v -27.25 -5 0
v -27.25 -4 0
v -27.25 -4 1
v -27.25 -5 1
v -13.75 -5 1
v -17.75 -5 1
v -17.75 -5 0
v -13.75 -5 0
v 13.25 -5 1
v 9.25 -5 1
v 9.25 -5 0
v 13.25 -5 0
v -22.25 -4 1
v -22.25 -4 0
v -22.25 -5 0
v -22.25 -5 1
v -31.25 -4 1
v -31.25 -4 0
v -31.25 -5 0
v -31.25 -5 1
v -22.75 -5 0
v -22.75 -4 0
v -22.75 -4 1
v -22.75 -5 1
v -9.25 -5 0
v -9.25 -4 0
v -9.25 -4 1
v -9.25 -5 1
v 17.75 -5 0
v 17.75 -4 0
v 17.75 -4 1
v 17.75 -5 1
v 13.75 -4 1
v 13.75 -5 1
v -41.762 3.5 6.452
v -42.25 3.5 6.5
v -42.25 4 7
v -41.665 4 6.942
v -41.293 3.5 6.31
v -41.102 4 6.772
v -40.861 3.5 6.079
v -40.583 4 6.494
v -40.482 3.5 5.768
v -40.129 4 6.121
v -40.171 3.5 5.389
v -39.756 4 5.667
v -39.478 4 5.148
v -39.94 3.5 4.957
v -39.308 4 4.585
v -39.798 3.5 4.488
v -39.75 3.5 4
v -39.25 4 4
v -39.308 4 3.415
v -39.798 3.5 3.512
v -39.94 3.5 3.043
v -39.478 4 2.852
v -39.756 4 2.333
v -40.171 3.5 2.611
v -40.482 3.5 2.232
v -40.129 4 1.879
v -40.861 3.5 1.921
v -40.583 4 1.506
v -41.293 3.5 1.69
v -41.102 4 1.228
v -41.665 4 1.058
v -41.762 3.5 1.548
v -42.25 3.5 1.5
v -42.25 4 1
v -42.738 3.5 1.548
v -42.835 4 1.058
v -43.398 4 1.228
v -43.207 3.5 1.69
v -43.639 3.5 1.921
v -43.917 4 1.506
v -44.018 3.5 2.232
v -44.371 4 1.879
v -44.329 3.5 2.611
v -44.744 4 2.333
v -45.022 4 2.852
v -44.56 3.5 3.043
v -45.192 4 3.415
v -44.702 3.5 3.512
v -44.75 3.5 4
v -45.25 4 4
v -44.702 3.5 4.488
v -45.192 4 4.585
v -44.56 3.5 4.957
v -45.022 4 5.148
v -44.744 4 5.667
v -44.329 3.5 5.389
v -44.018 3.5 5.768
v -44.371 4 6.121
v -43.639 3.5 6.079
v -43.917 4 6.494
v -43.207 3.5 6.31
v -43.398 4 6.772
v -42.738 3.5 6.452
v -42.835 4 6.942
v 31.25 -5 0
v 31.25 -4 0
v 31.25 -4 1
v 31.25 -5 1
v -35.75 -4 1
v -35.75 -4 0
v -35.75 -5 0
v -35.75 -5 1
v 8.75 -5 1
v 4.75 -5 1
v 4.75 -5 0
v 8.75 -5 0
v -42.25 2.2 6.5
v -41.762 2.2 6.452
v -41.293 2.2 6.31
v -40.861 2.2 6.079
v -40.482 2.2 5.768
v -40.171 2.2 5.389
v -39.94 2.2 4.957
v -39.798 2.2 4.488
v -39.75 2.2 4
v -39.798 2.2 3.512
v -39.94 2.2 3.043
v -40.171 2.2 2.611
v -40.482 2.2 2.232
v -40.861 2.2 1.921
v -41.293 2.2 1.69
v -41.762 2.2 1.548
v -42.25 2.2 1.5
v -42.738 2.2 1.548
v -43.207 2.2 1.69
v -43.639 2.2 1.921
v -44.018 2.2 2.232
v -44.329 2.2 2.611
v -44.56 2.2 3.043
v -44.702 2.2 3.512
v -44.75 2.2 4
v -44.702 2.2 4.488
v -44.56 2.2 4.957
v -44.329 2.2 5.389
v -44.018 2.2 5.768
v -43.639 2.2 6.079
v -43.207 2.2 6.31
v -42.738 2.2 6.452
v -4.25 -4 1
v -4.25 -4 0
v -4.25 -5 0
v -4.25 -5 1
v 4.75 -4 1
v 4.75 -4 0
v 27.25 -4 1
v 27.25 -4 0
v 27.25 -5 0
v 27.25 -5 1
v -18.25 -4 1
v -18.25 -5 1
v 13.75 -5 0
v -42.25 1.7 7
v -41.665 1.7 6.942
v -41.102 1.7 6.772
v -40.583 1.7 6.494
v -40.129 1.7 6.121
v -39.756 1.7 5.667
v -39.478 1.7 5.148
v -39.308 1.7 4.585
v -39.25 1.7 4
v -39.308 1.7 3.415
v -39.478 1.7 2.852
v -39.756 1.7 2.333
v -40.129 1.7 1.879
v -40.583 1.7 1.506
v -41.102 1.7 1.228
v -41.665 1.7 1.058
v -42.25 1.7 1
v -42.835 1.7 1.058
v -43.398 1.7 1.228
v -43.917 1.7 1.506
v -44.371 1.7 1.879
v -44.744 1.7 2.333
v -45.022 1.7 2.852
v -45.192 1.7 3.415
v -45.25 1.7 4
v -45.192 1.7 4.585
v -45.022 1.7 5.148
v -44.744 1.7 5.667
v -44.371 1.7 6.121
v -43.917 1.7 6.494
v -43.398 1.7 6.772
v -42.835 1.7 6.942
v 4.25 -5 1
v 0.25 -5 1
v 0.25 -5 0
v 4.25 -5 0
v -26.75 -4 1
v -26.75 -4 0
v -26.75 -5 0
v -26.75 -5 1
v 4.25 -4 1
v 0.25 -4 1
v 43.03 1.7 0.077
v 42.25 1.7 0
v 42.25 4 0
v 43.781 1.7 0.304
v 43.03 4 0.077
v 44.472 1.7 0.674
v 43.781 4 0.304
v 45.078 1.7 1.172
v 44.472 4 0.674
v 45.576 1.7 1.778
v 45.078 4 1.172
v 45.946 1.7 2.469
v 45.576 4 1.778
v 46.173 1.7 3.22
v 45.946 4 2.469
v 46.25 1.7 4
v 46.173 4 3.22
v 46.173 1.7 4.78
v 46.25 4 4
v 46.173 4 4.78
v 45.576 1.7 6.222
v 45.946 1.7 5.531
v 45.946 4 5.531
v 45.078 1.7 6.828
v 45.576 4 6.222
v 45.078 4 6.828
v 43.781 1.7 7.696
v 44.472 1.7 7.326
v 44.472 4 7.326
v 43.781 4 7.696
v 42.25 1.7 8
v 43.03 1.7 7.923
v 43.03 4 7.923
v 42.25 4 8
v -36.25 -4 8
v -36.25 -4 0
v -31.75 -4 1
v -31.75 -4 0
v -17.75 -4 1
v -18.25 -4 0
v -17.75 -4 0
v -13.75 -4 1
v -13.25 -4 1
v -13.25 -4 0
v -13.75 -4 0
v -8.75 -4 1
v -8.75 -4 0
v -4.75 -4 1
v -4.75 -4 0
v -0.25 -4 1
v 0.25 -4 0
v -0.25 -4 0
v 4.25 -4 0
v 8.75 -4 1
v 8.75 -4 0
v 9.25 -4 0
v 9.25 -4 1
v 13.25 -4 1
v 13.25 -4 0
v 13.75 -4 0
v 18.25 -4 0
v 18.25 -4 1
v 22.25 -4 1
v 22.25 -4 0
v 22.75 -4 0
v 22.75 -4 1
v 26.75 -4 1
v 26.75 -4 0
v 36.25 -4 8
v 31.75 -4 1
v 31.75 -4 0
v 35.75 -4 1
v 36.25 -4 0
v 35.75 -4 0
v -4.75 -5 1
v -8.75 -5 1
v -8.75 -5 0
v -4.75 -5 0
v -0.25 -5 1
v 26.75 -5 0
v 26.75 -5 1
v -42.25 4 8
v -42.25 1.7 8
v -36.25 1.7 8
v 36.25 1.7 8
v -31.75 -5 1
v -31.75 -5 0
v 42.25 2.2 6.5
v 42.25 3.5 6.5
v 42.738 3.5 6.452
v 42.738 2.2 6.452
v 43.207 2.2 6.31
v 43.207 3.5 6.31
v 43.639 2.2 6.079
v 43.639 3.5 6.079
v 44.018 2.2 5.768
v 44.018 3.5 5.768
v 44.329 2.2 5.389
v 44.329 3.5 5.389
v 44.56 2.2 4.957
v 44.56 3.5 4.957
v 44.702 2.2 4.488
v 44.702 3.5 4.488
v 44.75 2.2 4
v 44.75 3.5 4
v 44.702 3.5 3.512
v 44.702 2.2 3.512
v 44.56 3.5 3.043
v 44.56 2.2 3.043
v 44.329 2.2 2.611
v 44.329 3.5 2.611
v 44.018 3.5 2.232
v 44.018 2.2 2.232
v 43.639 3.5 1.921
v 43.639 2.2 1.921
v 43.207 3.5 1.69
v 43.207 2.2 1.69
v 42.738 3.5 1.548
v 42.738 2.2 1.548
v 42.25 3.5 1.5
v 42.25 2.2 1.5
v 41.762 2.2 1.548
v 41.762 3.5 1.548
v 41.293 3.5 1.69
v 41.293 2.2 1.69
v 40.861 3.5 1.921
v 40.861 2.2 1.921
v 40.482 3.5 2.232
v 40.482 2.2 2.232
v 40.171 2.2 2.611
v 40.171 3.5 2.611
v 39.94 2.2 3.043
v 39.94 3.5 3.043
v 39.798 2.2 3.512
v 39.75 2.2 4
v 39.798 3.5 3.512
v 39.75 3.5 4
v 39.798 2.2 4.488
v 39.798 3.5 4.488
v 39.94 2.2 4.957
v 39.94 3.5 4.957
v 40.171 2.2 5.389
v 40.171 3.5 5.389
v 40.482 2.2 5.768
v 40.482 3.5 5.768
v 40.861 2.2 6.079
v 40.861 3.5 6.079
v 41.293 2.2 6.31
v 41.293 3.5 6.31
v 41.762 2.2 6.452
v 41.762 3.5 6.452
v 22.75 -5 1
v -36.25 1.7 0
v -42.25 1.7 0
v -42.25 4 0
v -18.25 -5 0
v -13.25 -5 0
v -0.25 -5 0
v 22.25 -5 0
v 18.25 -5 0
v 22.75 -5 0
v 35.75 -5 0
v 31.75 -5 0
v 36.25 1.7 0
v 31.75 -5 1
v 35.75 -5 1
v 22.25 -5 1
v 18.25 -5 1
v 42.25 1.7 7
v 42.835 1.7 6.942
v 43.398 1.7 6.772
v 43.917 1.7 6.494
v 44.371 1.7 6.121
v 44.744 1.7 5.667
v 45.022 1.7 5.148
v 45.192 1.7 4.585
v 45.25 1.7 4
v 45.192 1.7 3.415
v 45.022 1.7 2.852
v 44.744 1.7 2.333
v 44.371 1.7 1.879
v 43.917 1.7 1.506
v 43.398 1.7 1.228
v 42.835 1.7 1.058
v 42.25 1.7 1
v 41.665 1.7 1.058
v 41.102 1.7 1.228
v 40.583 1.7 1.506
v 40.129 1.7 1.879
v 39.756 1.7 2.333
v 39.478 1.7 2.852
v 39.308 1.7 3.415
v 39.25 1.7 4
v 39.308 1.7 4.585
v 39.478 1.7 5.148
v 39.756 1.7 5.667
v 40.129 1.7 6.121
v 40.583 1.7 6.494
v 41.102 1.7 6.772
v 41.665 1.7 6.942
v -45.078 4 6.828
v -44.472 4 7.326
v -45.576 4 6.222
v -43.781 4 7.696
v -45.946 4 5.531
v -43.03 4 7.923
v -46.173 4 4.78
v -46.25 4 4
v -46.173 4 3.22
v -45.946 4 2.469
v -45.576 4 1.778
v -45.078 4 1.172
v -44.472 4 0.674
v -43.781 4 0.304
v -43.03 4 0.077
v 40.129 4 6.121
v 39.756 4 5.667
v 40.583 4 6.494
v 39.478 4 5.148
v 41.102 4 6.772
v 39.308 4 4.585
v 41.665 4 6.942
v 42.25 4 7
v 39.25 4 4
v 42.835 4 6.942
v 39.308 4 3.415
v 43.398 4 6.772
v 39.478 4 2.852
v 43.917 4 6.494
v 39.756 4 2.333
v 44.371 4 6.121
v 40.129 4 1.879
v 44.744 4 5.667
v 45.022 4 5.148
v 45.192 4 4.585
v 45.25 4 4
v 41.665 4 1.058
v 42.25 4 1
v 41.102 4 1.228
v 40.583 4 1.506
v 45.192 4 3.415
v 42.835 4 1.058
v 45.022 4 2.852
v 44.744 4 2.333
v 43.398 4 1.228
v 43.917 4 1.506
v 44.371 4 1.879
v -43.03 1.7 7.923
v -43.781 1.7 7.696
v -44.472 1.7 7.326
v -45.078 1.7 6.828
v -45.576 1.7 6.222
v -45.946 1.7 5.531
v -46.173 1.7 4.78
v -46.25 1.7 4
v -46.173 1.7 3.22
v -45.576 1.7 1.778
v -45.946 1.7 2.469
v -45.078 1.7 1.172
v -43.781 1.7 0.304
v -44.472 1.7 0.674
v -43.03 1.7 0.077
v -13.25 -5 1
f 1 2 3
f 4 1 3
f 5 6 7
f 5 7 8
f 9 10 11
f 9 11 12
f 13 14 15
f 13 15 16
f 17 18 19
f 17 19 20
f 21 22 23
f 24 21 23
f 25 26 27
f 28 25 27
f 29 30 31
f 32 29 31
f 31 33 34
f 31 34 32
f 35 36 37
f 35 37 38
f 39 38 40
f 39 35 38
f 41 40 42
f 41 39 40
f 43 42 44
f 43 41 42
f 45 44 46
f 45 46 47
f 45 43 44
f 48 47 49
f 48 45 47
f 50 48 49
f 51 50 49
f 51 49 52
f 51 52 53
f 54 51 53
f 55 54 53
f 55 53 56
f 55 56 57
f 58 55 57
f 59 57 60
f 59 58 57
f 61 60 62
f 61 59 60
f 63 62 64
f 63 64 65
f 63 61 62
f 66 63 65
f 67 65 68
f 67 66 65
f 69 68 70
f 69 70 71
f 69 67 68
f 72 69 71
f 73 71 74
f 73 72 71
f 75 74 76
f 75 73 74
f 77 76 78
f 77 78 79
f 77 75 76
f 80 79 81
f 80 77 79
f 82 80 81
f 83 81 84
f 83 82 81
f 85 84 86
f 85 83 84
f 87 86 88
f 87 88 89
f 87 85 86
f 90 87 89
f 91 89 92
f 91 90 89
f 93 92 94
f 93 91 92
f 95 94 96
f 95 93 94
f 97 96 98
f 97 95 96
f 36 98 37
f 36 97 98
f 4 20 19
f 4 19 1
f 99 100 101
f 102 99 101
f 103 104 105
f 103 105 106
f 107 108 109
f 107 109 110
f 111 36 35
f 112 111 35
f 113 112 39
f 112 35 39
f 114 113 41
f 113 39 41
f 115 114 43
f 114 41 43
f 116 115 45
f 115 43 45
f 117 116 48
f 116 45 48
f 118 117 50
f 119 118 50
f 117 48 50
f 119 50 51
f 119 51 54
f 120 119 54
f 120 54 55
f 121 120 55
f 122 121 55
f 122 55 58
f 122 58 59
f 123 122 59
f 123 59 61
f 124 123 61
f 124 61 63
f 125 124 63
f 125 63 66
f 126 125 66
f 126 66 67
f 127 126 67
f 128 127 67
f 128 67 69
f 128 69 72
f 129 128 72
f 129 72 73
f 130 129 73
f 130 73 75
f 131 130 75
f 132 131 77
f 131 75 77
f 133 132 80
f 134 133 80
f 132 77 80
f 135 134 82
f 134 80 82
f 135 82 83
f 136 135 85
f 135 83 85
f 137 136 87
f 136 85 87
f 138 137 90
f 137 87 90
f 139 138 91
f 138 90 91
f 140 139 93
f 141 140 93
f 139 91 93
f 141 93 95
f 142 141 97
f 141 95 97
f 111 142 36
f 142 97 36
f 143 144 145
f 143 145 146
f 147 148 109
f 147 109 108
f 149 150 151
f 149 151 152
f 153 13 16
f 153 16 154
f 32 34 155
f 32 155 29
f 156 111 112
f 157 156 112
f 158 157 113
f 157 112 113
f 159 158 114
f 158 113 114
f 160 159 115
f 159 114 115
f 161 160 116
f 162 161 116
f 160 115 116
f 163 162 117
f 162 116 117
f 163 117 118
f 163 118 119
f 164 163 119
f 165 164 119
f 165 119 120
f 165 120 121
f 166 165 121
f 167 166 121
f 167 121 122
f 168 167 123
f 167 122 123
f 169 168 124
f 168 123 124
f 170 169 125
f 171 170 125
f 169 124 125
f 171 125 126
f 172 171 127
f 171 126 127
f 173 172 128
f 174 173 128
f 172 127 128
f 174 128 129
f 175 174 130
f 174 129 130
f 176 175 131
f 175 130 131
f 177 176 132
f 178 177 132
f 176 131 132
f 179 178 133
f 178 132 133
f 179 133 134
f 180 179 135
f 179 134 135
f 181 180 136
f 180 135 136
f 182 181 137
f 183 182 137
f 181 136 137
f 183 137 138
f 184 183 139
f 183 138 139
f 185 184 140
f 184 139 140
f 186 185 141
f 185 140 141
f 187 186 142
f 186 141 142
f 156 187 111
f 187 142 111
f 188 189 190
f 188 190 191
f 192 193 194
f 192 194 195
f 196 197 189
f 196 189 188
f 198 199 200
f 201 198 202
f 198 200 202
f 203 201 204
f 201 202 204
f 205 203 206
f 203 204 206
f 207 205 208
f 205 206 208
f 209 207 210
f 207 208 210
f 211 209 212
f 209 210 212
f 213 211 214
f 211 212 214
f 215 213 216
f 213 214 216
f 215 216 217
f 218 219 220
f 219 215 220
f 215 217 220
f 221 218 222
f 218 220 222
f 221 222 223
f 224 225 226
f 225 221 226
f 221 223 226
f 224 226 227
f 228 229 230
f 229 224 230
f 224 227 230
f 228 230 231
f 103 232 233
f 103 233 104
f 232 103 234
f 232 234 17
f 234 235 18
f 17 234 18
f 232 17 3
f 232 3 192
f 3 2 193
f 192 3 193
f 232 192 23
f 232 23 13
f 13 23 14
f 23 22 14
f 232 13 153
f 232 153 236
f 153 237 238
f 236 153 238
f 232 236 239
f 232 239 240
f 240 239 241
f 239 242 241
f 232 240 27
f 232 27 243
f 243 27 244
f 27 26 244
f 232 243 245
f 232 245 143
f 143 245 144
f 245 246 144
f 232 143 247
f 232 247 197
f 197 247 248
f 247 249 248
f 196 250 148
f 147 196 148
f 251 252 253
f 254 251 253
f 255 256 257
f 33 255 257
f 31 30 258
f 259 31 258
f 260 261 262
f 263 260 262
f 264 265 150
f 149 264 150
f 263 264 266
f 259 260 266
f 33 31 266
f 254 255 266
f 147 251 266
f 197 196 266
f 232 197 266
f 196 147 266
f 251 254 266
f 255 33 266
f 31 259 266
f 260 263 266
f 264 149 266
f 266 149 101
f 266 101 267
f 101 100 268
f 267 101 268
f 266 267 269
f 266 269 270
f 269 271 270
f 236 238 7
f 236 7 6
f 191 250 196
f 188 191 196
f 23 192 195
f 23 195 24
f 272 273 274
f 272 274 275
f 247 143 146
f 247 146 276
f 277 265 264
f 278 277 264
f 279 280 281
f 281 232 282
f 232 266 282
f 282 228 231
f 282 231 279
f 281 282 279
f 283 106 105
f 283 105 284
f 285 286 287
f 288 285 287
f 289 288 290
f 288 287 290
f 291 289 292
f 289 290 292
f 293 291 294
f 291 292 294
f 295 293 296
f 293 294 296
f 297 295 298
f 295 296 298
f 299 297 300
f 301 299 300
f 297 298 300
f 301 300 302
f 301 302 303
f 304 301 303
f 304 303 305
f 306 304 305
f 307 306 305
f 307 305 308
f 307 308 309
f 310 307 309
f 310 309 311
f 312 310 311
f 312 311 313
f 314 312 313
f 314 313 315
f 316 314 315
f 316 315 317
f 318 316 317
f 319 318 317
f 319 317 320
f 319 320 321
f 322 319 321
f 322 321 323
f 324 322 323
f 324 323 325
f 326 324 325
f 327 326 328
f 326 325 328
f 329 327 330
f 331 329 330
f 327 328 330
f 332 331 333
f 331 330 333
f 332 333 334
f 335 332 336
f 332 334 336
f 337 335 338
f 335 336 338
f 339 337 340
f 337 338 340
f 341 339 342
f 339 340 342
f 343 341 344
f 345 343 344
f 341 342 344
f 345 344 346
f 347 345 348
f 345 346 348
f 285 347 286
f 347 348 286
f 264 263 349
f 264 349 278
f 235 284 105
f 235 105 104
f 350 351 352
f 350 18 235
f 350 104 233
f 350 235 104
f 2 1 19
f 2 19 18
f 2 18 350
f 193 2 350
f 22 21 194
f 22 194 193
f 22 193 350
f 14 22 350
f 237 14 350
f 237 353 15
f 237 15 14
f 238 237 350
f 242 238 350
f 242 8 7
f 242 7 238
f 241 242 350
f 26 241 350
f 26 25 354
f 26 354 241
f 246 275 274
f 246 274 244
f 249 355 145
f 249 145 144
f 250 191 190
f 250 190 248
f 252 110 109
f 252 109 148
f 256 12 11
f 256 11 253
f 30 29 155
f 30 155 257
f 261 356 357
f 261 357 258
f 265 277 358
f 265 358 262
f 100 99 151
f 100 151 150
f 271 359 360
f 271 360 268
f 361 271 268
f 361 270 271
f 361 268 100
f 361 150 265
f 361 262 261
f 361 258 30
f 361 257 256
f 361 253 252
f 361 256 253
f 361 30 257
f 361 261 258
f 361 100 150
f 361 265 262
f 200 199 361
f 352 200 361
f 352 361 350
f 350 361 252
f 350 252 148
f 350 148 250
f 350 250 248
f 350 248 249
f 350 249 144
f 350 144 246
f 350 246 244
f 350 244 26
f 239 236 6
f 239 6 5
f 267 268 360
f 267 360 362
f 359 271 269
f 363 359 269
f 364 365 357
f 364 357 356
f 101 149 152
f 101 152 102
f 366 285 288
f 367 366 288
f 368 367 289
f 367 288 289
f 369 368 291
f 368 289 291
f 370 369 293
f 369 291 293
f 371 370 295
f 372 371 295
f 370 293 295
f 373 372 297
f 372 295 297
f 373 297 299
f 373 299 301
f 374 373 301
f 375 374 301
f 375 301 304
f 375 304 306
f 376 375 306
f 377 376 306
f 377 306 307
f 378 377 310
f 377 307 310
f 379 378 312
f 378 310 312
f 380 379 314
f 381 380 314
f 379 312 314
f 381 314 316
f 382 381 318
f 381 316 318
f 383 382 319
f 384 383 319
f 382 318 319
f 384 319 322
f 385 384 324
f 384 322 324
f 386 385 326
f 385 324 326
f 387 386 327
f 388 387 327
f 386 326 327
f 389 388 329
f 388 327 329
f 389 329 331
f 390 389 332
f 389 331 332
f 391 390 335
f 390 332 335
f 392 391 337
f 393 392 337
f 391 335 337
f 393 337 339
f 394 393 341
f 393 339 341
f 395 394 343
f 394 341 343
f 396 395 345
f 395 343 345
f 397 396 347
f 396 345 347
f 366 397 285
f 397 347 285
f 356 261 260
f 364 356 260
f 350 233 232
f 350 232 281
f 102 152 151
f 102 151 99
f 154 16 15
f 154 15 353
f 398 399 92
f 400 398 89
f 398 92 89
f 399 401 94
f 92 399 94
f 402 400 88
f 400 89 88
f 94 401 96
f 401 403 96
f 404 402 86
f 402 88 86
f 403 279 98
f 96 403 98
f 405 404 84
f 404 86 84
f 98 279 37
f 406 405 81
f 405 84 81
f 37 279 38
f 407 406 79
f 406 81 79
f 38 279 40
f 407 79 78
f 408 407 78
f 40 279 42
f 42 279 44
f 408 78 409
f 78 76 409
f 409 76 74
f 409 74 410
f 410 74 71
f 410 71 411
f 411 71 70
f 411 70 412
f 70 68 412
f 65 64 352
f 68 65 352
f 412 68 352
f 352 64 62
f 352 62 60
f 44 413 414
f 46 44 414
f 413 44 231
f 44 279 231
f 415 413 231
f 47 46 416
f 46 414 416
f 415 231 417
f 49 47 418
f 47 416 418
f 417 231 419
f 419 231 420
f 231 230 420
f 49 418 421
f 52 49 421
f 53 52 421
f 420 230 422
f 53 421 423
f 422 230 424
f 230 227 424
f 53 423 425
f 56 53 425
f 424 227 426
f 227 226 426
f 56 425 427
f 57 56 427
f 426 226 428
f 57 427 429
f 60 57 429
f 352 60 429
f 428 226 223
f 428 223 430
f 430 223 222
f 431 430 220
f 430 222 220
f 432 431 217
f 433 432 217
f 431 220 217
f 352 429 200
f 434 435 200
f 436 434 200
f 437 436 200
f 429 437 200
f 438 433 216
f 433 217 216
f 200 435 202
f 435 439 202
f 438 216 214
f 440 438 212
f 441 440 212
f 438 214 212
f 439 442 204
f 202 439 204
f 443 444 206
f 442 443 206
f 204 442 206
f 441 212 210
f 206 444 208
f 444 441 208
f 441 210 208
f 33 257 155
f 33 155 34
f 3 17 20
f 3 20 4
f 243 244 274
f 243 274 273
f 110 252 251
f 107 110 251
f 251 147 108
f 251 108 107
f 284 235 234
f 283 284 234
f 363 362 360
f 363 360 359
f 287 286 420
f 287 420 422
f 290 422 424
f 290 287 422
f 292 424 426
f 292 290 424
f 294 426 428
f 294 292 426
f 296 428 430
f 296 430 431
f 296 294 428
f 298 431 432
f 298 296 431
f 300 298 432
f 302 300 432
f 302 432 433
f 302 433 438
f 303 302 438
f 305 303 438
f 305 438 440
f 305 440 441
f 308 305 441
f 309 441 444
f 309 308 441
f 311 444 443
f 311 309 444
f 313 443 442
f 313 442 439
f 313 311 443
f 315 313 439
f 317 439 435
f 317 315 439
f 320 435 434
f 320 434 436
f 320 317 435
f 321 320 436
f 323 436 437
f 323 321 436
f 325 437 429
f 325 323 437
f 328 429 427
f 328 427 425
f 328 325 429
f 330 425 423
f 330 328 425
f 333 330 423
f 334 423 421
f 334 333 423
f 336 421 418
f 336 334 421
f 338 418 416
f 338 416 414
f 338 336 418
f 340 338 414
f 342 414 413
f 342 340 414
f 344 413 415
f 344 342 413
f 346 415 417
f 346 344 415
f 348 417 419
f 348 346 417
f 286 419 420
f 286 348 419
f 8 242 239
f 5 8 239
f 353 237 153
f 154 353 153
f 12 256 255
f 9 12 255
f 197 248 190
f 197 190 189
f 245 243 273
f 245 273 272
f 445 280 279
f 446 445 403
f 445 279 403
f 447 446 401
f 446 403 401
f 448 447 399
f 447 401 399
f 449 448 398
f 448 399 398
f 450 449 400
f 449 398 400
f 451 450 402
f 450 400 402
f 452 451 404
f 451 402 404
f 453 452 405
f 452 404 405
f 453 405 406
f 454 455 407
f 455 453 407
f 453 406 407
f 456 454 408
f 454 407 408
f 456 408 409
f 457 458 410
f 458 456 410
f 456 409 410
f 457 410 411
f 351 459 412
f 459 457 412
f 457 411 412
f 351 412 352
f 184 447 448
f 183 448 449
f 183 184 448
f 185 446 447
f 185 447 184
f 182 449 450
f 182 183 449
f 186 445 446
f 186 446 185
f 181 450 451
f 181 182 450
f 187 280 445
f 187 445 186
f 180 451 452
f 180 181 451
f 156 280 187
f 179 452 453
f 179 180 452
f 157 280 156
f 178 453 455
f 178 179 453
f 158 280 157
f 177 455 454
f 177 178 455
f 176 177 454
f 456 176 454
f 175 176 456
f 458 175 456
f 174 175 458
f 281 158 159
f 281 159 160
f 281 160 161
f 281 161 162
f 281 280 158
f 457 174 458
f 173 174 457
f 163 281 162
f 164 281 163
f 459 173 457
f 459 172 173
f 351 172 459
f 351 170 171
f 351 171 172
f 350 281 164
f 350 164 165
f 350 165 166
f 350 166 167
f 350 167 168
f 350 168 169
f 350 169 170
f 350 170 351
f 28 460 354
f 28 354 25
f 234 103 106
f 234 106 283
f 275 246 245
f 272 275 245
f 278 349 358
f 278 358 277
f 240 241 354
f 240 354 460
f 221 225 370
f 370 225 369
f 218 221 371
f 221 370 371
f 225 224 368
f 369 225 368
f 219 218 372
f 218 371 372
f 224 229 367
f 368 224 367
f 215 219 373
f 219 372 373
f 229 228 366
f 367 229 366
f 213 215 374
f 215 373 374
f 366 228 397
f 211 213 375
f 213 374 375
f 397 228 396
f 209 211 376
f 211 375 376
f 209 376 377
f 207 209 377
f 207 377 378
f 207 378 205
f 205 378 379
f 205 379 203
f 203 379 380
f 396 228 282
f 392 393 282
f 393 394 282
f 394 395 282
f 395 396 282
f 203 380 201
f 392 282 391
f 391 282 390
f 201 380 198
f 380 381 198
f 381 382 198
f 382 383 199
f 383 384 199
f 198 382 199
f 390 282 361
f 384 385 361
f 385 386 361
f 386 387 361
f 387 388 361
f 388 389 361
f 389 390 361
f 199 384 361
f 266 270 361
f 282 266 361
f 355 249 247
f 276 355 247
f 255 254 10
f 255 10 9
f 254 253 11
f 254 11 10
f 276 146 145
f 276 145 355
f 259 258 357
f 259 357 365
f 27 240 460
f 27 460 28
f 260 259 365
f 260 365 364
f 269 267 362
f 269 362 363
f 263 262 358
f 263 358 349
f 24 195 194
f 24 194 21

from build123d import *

# Parameters (mm, degrees)
SKETCH1_W           = 72.5
SKETCH1_H           = 8
BOSS_EXTRUDE1_DEPTH = 8
SKETCH2_W           = 4
SKETCH2_H           = 1
EXTRUDE_THIN1_DEPTH = 1
LPATTERN1_COUNT     = 8
LPATTERN1_PITCH     = 4.5
LPATTERN1_COL_COUNT = 9
LPATTERN1_COL_PITCH = 4.5
SKETCH3_W           = 8
SKETCH3_H           = 2.3
BOSS_EXTRUDE2_DEPTH = 12
SKETCH4_OUTSIDE_W   = 117.95
SKETCH4_OUTSIDE_H   = 29.45
SKETCH4_OUTSIDE_R   = 2.5
CUT_EXTRUDE1_DEPTH  = 50.729895435
CHAMFER1_SIZE       = 0.5


with BuildPart() as part:
    # Sketch1 → Boss-Extrude1 (new body)
    with BuildSketch(Plane.XY):
        Rectangle(SKETCH1_W, SKETCH1_H)
    extrude(amount=BOSS_EXTRUDE1_DEPTH)

    # Sketch2 → Extrude-Thin1 (add)
    with BuildSketch(Plane.XZ.offset(4)):
        with Locations((-2.25, 0.5)):
            Rectangle(SKETCH2_W, SKETCH2_H)
    extrude_thin1 = extrude(amount=EXTRUDE_THIN1_DEPTH)

    # LPattern1: Extrude-Thin1 ×8
    with Locations(*[(-i * LPATTERN1_PITCH, 0, 0) for i in range(1, LPATTERN1_COUNT)]):
        add(extrude_thin1)

    # LPattern1 col: Extrude-Thin1 ×9
    with Locations(*[(i * LPATTERN1_COL_PITCH, 0, 0) for i in range(1, LPATTERN1_COL_COUNT)]):
        add(extrude_thin1)

    # Sketch3 → Boss-Extrude2 (add)
    with BuildSketch(Plane(origin=(36.25, 0, 0), x_dir=(0, 0, -1), z_dir=(1, 0, 0))):
        with Locations((-4, 2.85)):
            Rectangle(SKETCH3_W, SKETCH3_H)
    boss_extrude2 = extrude(amount=BOSS_EXTRUDE2_DEPTH)

    # Mirror1: Boss-Extrude2 across plane
    add(boss_extrude2.mirror(Plane(origin=(0, 0, 0), x_dir=(0, 0, 1), z_dir=(1, 0, 0))))

    # Sketch4 outside → Cut-Extrude1 (cut, through all)
    # profile 1 of 3: a face of its own
    with BuildSketch(Plane(origin=(0, 4, 0), x_dir=(1, 0, 0), z_dir=(0, 1, 0))):
        with Locations((0, -4)):
            Rectangle(SKETCH4_OUTSIDE_W, SKETCH4_OUTSIDE_H)
        with BuildLine():
            Line((-42.25, 0), (42.25, 0))
            ThreePointArc((42.25, 0), (46.25, -4), (42.25, -8))
            Line((42.25, -8), (-42.25, -8))
            ThreePointArc((-42.25, -8), (-46.25, -4), (-42.25, 0))
        make_face(mode=Mode.SUBTRACT)
    # profile 2 of 3: a face of its own
    with BuildSketch(Plane(origin=(0, 4, 0), x_dir=(1, 0, 0), z_dir=(0, 1, 0))):
        with Locations(Location((-42.25, -4, 0), (0, 0, 270))):
            Circle(SKETCH4_OUTSIDE_R)
    # profile 3 of 3: a face of its own
    with BuildSketch(Plane(origin=(0, 4, 0), x_dir=(1, 0, 0), z_dir=(0, 1, 0))):
        with Locations(Location((42.25, -4, 0), (0, 0, 270))):
            Circle(SKETCH4_OUTSIDE_R)
    extrude(amount=-CUT_EXTRUDE1_DEPTH, mode=Mode.SUBTRACT)

    # Chamfer1
    chamfer1_edges = [part.edges().sort_by_distance(p)[0] for p in [
        (42.25, 1.7, 1.5),
        (42.25, 4, 1.5),
        (-42.25, 1.7, 1.5),
        (-42.25, 4, 1.5),
    ]]
    chamfer(chamfer1_edges, length=CHAMFER1_SIZE)


solid = part.part
